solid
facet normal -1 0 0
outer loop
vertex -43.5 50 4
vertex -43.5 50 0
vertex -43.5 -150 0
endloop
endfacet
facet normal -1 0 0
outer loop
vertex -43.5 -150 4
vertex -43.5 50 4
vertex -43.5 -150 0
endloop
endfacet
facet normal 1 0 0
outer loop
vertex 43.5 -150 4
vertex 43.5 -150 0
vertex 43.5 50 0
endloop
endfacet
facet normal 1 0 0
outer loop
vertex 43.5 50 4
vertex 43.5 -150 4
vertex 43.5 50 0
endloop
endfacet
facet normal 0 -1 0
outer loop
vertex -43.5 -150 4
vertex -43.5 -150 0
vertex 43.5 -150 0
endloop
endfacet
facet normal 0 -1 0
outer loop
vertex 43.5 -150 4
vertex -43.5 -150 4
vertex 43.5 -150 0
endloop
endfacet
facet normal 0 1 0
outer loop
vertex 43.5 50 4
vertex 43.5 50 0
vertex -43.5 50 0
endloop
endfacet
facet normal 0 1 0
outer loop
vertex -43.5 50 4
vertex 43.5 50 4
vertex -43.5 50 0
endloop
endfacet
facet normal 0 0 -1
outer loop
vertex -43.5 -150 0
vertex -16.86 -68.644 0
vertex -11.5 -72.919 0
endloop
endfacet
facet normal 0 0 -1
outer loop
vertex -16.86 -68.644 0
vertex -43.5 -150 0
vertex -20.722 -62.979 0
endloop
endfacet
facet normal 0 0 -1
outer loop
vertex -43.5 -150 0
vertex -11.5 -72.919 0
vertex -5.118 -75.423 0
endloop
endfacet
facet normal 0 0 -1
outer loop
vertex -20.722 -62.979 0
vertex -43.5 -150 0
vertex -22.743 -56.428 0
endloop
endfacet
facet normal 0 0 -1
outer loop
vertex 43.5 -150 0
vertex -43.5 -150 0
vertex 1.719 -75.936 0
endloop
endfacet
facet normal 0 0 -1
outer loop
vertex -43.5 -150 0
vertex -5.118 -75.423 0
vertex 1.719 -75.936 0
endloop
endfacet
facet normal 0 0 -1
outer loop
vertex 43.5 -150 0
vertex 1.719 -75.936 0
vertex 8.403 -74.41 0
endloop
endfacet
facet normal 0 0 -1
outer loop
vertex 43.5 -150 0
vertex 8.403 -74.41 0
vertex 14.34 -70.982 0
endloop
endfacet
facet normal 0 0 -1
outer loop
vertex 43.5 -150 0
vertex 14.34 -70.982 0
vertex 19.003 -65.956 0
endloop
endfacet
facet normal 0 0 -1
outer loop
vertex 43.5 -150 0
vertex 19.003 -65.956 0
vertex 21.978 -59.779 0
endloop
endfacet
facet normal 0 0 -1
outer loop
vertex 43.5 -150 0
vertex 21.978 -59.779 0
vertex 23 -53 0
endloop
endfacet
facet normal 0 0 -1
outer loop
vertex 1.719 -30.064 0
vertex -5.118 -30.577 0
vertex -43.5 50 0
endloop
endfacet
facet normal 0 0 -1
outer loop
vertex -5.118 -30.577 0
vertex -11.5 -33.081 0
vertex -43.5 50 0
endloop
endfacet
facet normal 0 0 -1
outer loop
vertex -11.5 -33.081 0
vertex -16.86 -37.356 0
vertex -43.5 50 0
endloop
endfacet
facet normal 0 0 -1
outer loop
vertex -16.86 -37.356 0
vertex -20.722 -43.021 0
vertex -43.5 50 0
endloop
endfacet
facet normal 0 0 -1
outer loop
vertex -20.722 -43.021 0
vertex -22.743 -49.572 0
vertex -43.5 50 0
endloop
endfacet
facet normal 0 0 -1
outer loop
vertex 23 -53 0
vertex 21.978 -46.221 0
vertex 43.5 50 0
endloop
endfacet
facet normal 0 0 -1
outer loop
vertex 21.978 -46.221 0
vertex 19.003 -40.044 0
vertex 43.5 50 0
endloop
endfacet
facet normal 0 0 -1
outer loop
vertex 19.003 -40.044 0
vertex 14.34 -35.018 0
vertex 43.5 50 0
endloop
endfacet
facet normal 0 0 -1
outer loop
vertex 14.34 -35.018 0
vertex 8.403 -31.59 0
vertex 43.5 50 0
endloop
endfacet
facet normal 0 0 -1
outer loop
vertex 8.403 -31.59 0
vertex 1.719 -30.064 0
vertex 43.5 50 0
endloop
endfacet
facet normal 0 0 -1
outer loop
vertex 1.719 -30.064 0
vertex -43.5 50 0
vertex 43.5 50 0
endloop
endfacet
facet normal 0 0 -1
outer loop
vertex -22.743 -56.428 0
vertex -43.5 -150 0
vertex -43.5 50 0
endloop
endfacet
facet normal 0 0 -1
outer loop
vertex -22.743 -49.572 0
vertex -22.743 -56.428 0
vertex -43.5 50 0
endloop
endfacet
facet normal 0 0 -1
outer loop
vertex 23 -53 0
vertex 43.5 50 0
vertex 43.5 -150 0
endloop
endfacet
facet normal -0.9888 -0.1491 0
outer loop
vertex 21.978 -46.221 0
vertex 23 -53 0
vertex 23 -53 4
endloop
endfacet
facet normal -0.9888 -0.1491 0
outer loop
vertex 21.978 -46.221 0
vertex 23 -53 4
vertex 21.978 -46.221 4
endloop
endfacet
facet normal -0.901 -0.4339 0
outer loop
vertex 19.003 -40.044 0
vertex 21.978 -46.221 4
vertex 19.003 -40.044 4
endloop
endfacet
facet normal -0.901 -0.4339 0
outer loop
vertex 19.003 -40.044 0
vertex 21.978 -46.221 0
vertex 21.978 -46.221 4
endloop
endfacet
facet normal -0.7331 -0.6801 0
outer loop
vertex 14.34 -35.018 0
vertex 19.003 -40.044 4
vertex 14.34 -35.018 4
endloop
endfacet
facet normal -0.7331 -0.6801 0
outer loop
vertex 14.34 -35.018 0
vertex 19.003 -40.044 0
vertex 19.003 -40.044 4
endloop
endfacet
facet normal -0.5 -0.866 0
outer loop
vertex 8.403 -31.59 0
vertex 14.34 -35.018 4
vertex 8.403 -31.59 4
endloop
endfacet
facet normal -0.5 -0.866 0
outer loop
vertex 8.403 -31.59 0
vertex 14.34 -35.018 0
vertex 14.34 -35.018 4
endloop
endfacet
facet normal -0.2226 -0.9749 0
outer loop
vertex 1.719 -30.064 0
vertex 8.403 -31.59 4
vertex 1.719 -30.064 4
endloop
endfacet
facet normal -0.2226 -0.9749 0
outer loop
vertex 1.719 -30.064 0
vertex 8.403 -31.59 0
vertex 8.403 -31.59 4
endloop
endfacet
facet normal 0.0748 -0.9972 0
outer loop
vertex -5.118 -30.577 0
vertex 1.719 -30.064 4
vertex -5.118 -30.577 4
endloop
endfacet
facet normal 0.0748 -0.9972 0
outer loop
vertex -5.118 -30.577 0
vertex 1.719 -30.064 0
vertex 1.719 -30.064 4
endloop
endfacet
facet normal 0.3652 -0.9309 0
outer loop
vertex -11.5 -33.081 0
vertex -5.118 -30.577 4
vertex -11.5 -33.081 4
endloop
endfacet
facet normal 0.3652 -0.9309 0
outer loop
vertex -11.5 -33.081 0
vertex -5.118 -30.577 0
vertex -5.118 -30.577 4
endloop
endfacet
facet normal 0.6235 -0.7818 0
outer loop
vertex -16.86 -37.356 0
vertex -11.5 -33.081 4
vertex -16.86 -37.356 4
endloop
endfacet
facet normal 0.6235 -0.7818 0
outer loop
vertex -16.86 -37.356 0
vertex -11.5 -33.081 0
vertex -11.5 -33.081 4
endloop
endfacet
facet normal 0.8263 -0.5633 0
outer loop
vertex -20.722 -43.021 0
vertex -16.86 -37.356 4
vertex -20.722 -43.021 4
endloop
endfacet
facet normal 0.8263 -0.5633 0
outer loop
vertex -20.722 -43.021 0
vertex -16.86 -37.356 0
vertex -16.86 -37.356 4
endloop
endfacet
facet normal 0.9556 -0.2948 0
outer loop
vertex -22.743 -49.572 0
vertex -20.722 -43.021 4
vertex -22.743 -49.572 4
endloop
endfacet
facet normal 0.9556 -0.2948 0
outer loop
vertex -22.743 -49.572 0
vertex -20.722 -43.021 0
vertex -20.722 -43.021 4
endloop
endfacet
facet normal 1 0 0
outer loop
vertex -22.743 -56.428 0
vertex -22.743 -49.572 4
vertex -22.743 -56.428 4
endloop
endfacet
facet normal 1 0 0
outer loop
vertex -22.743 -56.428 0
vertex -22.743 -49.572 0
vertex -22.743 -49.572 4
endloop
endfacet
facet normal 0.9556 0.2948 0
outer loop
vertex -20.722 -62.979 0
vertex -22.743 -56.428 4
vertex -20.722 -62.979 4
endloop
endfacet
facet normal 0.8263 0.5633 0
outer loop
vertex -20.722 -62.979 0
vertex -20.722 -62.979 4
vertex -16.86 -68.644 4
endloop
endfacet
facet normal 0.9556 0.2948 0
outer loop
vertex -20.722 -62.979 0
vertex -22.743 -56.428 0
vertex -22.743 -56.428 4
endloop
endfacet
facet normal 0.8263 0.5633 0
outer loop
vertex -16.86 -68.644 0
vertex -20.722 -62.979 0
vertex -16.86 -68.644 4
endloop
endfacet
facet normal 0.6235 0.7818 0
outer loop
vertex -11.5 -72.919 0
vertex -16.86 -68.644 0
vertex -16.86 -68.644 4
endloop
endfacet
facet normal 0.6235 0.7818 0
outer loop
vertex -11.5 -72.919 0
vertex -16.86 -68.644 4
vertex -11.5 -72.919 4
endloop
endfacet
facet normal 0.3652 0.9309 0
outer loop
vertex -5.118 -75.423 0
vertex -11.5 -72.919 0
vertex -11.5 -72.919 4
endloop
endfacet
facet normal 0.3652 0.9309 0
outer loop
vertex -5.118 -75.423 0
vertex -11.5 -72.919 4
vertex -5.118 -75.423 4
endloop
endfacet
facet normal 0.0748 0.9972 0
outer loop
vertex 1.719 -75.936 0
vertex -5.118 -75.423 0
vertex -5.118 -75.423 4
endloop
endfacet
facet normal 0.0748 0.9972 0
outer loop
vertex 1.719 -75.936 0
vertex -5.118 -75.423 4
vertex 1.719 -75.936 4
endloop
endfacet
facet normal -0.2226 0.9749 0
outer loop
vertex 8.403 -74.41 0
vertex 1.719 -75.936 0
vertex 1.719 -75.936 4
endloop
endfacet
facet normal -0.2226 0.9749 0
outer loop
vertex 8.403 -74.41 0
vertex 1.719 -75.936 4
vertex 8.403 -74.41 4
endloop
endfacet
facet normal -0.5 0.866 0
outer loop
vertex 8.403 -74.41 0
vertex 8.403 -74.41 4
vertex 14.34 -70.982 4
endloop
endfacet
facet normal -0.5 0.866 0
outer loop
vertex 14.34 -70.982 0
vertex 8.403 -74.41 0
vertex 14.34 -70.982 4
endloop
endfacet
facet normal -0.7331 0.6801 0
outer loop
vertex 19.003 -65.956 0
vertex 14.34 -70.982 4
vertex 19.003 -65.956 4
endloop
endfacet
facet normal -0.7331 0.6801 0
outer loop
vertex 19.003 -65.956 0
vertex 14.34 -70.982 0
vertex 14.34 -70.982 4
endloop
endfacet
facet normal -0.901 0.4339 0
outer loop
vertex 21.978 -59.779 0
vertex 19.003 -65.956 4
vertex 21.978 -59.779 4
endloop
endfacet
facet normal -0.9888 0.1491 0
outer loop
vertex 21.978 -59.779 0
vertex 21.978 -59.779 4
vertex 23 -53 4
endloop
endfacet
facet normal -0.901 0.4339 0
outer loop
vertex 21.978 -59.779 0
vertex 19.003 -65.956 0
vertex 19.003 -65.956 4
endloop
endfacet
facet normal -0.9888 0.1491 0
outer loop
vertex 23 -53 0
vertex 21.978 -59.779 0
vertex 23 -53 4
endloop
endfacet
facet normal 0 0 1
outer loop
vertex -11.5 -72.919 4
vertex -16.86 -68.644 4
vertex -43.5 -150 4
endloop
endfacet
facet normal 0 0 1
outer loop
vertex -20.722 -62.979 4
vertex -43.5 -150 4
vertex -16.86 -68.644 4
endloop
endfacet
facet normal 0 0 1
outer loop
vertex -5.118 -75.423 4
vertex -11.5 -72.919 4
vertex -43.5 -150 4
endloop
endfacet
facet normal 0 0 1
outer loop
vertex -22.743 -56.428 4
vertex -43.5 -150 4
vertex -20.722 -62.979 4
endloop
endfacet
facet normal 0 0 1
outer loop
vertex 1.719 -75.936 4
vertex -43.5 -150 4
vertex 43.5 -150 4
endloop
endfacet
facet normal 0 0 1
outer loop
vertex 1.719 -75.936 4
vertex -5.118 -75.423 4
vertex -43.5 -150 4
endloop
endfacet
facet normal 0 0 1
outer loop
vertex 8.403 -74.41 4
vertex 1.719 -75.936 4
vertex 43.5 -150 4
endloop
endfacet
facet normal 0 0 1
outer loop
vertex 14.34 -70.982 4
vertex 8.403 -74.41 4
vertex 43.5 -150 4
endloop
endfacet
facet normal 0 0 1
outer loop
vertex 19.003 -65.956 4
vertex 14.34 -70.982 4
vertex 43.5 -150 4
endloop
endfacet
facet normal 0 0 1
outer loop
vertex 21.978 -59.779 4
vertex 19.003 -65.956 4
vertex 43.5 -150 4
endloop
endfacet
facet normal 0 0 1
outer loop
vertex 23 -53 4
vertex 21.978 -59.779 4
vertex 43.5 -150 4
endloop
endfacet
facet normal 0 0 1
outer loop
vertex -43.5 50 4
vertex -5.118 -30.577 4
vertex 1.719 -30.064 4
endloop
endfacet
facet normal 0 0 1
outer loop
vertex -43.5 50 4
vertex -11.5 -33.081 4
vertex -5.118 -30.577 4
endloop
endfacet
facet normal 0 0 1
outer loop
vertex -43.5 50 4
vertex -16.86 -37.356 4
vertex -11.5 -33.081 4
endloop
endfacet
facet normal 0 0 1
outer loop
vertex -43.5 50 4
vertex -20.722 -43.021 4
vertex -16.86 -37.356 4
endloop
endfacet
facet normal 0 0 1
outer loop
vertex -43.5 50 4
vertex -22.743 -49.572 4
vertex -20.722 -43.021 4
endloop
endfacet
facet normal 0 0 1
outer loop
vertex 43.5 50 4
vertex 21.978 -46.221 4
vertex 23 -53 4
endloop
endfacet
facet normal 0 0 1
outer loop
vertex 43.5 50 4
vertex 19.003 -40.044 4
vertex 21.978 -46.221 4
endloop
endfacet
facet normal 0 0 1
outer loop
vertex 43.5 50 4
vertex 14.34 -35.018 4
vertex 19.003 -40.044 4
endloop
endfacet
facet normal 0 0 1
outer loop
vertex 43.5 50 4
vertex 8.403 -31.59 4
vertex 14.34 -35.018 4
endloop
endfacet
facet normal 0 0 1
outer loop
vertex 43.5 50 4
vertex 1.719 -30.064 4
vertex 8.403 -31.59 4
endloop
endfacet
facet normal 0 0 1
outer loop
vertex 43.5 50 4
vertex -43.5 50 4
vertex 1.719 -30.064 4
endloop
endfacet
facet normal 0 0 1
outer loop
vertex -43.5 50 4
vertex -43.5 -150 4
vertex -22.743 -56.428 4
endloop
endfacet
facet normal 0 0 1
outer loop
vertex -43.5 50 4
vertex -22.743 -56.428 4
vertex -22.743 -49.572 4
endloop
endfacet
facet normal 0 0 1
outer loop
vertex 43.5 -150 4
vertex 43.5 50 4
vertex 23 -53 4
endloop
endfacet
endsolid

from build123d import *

# Parameters (mm, degrees)
SKETCH_1_R      = 23
EXTRUDE_1_DEPTH = 4


with BuildPart() as part:
    # 草图1 → 凸台-拉伸1 (new body)
    with BuildSketch(Plane.XY):
        Polygon((37.5, 50), (-37.5, 50), (-43.5, 50), (-43.5, -50), (-43.5, -150), (-37.5, -150), (37.5, -150), (43.5, -150), (43.5, -50), (43.5, 50), align=None)
        with Locations((0, -53)):
            Circle(SKETCH_1_R, mode=Mode.SUBTRACT)
    extrude(amount=EXTRUDE_1_DEPTH)


solid = part.part
